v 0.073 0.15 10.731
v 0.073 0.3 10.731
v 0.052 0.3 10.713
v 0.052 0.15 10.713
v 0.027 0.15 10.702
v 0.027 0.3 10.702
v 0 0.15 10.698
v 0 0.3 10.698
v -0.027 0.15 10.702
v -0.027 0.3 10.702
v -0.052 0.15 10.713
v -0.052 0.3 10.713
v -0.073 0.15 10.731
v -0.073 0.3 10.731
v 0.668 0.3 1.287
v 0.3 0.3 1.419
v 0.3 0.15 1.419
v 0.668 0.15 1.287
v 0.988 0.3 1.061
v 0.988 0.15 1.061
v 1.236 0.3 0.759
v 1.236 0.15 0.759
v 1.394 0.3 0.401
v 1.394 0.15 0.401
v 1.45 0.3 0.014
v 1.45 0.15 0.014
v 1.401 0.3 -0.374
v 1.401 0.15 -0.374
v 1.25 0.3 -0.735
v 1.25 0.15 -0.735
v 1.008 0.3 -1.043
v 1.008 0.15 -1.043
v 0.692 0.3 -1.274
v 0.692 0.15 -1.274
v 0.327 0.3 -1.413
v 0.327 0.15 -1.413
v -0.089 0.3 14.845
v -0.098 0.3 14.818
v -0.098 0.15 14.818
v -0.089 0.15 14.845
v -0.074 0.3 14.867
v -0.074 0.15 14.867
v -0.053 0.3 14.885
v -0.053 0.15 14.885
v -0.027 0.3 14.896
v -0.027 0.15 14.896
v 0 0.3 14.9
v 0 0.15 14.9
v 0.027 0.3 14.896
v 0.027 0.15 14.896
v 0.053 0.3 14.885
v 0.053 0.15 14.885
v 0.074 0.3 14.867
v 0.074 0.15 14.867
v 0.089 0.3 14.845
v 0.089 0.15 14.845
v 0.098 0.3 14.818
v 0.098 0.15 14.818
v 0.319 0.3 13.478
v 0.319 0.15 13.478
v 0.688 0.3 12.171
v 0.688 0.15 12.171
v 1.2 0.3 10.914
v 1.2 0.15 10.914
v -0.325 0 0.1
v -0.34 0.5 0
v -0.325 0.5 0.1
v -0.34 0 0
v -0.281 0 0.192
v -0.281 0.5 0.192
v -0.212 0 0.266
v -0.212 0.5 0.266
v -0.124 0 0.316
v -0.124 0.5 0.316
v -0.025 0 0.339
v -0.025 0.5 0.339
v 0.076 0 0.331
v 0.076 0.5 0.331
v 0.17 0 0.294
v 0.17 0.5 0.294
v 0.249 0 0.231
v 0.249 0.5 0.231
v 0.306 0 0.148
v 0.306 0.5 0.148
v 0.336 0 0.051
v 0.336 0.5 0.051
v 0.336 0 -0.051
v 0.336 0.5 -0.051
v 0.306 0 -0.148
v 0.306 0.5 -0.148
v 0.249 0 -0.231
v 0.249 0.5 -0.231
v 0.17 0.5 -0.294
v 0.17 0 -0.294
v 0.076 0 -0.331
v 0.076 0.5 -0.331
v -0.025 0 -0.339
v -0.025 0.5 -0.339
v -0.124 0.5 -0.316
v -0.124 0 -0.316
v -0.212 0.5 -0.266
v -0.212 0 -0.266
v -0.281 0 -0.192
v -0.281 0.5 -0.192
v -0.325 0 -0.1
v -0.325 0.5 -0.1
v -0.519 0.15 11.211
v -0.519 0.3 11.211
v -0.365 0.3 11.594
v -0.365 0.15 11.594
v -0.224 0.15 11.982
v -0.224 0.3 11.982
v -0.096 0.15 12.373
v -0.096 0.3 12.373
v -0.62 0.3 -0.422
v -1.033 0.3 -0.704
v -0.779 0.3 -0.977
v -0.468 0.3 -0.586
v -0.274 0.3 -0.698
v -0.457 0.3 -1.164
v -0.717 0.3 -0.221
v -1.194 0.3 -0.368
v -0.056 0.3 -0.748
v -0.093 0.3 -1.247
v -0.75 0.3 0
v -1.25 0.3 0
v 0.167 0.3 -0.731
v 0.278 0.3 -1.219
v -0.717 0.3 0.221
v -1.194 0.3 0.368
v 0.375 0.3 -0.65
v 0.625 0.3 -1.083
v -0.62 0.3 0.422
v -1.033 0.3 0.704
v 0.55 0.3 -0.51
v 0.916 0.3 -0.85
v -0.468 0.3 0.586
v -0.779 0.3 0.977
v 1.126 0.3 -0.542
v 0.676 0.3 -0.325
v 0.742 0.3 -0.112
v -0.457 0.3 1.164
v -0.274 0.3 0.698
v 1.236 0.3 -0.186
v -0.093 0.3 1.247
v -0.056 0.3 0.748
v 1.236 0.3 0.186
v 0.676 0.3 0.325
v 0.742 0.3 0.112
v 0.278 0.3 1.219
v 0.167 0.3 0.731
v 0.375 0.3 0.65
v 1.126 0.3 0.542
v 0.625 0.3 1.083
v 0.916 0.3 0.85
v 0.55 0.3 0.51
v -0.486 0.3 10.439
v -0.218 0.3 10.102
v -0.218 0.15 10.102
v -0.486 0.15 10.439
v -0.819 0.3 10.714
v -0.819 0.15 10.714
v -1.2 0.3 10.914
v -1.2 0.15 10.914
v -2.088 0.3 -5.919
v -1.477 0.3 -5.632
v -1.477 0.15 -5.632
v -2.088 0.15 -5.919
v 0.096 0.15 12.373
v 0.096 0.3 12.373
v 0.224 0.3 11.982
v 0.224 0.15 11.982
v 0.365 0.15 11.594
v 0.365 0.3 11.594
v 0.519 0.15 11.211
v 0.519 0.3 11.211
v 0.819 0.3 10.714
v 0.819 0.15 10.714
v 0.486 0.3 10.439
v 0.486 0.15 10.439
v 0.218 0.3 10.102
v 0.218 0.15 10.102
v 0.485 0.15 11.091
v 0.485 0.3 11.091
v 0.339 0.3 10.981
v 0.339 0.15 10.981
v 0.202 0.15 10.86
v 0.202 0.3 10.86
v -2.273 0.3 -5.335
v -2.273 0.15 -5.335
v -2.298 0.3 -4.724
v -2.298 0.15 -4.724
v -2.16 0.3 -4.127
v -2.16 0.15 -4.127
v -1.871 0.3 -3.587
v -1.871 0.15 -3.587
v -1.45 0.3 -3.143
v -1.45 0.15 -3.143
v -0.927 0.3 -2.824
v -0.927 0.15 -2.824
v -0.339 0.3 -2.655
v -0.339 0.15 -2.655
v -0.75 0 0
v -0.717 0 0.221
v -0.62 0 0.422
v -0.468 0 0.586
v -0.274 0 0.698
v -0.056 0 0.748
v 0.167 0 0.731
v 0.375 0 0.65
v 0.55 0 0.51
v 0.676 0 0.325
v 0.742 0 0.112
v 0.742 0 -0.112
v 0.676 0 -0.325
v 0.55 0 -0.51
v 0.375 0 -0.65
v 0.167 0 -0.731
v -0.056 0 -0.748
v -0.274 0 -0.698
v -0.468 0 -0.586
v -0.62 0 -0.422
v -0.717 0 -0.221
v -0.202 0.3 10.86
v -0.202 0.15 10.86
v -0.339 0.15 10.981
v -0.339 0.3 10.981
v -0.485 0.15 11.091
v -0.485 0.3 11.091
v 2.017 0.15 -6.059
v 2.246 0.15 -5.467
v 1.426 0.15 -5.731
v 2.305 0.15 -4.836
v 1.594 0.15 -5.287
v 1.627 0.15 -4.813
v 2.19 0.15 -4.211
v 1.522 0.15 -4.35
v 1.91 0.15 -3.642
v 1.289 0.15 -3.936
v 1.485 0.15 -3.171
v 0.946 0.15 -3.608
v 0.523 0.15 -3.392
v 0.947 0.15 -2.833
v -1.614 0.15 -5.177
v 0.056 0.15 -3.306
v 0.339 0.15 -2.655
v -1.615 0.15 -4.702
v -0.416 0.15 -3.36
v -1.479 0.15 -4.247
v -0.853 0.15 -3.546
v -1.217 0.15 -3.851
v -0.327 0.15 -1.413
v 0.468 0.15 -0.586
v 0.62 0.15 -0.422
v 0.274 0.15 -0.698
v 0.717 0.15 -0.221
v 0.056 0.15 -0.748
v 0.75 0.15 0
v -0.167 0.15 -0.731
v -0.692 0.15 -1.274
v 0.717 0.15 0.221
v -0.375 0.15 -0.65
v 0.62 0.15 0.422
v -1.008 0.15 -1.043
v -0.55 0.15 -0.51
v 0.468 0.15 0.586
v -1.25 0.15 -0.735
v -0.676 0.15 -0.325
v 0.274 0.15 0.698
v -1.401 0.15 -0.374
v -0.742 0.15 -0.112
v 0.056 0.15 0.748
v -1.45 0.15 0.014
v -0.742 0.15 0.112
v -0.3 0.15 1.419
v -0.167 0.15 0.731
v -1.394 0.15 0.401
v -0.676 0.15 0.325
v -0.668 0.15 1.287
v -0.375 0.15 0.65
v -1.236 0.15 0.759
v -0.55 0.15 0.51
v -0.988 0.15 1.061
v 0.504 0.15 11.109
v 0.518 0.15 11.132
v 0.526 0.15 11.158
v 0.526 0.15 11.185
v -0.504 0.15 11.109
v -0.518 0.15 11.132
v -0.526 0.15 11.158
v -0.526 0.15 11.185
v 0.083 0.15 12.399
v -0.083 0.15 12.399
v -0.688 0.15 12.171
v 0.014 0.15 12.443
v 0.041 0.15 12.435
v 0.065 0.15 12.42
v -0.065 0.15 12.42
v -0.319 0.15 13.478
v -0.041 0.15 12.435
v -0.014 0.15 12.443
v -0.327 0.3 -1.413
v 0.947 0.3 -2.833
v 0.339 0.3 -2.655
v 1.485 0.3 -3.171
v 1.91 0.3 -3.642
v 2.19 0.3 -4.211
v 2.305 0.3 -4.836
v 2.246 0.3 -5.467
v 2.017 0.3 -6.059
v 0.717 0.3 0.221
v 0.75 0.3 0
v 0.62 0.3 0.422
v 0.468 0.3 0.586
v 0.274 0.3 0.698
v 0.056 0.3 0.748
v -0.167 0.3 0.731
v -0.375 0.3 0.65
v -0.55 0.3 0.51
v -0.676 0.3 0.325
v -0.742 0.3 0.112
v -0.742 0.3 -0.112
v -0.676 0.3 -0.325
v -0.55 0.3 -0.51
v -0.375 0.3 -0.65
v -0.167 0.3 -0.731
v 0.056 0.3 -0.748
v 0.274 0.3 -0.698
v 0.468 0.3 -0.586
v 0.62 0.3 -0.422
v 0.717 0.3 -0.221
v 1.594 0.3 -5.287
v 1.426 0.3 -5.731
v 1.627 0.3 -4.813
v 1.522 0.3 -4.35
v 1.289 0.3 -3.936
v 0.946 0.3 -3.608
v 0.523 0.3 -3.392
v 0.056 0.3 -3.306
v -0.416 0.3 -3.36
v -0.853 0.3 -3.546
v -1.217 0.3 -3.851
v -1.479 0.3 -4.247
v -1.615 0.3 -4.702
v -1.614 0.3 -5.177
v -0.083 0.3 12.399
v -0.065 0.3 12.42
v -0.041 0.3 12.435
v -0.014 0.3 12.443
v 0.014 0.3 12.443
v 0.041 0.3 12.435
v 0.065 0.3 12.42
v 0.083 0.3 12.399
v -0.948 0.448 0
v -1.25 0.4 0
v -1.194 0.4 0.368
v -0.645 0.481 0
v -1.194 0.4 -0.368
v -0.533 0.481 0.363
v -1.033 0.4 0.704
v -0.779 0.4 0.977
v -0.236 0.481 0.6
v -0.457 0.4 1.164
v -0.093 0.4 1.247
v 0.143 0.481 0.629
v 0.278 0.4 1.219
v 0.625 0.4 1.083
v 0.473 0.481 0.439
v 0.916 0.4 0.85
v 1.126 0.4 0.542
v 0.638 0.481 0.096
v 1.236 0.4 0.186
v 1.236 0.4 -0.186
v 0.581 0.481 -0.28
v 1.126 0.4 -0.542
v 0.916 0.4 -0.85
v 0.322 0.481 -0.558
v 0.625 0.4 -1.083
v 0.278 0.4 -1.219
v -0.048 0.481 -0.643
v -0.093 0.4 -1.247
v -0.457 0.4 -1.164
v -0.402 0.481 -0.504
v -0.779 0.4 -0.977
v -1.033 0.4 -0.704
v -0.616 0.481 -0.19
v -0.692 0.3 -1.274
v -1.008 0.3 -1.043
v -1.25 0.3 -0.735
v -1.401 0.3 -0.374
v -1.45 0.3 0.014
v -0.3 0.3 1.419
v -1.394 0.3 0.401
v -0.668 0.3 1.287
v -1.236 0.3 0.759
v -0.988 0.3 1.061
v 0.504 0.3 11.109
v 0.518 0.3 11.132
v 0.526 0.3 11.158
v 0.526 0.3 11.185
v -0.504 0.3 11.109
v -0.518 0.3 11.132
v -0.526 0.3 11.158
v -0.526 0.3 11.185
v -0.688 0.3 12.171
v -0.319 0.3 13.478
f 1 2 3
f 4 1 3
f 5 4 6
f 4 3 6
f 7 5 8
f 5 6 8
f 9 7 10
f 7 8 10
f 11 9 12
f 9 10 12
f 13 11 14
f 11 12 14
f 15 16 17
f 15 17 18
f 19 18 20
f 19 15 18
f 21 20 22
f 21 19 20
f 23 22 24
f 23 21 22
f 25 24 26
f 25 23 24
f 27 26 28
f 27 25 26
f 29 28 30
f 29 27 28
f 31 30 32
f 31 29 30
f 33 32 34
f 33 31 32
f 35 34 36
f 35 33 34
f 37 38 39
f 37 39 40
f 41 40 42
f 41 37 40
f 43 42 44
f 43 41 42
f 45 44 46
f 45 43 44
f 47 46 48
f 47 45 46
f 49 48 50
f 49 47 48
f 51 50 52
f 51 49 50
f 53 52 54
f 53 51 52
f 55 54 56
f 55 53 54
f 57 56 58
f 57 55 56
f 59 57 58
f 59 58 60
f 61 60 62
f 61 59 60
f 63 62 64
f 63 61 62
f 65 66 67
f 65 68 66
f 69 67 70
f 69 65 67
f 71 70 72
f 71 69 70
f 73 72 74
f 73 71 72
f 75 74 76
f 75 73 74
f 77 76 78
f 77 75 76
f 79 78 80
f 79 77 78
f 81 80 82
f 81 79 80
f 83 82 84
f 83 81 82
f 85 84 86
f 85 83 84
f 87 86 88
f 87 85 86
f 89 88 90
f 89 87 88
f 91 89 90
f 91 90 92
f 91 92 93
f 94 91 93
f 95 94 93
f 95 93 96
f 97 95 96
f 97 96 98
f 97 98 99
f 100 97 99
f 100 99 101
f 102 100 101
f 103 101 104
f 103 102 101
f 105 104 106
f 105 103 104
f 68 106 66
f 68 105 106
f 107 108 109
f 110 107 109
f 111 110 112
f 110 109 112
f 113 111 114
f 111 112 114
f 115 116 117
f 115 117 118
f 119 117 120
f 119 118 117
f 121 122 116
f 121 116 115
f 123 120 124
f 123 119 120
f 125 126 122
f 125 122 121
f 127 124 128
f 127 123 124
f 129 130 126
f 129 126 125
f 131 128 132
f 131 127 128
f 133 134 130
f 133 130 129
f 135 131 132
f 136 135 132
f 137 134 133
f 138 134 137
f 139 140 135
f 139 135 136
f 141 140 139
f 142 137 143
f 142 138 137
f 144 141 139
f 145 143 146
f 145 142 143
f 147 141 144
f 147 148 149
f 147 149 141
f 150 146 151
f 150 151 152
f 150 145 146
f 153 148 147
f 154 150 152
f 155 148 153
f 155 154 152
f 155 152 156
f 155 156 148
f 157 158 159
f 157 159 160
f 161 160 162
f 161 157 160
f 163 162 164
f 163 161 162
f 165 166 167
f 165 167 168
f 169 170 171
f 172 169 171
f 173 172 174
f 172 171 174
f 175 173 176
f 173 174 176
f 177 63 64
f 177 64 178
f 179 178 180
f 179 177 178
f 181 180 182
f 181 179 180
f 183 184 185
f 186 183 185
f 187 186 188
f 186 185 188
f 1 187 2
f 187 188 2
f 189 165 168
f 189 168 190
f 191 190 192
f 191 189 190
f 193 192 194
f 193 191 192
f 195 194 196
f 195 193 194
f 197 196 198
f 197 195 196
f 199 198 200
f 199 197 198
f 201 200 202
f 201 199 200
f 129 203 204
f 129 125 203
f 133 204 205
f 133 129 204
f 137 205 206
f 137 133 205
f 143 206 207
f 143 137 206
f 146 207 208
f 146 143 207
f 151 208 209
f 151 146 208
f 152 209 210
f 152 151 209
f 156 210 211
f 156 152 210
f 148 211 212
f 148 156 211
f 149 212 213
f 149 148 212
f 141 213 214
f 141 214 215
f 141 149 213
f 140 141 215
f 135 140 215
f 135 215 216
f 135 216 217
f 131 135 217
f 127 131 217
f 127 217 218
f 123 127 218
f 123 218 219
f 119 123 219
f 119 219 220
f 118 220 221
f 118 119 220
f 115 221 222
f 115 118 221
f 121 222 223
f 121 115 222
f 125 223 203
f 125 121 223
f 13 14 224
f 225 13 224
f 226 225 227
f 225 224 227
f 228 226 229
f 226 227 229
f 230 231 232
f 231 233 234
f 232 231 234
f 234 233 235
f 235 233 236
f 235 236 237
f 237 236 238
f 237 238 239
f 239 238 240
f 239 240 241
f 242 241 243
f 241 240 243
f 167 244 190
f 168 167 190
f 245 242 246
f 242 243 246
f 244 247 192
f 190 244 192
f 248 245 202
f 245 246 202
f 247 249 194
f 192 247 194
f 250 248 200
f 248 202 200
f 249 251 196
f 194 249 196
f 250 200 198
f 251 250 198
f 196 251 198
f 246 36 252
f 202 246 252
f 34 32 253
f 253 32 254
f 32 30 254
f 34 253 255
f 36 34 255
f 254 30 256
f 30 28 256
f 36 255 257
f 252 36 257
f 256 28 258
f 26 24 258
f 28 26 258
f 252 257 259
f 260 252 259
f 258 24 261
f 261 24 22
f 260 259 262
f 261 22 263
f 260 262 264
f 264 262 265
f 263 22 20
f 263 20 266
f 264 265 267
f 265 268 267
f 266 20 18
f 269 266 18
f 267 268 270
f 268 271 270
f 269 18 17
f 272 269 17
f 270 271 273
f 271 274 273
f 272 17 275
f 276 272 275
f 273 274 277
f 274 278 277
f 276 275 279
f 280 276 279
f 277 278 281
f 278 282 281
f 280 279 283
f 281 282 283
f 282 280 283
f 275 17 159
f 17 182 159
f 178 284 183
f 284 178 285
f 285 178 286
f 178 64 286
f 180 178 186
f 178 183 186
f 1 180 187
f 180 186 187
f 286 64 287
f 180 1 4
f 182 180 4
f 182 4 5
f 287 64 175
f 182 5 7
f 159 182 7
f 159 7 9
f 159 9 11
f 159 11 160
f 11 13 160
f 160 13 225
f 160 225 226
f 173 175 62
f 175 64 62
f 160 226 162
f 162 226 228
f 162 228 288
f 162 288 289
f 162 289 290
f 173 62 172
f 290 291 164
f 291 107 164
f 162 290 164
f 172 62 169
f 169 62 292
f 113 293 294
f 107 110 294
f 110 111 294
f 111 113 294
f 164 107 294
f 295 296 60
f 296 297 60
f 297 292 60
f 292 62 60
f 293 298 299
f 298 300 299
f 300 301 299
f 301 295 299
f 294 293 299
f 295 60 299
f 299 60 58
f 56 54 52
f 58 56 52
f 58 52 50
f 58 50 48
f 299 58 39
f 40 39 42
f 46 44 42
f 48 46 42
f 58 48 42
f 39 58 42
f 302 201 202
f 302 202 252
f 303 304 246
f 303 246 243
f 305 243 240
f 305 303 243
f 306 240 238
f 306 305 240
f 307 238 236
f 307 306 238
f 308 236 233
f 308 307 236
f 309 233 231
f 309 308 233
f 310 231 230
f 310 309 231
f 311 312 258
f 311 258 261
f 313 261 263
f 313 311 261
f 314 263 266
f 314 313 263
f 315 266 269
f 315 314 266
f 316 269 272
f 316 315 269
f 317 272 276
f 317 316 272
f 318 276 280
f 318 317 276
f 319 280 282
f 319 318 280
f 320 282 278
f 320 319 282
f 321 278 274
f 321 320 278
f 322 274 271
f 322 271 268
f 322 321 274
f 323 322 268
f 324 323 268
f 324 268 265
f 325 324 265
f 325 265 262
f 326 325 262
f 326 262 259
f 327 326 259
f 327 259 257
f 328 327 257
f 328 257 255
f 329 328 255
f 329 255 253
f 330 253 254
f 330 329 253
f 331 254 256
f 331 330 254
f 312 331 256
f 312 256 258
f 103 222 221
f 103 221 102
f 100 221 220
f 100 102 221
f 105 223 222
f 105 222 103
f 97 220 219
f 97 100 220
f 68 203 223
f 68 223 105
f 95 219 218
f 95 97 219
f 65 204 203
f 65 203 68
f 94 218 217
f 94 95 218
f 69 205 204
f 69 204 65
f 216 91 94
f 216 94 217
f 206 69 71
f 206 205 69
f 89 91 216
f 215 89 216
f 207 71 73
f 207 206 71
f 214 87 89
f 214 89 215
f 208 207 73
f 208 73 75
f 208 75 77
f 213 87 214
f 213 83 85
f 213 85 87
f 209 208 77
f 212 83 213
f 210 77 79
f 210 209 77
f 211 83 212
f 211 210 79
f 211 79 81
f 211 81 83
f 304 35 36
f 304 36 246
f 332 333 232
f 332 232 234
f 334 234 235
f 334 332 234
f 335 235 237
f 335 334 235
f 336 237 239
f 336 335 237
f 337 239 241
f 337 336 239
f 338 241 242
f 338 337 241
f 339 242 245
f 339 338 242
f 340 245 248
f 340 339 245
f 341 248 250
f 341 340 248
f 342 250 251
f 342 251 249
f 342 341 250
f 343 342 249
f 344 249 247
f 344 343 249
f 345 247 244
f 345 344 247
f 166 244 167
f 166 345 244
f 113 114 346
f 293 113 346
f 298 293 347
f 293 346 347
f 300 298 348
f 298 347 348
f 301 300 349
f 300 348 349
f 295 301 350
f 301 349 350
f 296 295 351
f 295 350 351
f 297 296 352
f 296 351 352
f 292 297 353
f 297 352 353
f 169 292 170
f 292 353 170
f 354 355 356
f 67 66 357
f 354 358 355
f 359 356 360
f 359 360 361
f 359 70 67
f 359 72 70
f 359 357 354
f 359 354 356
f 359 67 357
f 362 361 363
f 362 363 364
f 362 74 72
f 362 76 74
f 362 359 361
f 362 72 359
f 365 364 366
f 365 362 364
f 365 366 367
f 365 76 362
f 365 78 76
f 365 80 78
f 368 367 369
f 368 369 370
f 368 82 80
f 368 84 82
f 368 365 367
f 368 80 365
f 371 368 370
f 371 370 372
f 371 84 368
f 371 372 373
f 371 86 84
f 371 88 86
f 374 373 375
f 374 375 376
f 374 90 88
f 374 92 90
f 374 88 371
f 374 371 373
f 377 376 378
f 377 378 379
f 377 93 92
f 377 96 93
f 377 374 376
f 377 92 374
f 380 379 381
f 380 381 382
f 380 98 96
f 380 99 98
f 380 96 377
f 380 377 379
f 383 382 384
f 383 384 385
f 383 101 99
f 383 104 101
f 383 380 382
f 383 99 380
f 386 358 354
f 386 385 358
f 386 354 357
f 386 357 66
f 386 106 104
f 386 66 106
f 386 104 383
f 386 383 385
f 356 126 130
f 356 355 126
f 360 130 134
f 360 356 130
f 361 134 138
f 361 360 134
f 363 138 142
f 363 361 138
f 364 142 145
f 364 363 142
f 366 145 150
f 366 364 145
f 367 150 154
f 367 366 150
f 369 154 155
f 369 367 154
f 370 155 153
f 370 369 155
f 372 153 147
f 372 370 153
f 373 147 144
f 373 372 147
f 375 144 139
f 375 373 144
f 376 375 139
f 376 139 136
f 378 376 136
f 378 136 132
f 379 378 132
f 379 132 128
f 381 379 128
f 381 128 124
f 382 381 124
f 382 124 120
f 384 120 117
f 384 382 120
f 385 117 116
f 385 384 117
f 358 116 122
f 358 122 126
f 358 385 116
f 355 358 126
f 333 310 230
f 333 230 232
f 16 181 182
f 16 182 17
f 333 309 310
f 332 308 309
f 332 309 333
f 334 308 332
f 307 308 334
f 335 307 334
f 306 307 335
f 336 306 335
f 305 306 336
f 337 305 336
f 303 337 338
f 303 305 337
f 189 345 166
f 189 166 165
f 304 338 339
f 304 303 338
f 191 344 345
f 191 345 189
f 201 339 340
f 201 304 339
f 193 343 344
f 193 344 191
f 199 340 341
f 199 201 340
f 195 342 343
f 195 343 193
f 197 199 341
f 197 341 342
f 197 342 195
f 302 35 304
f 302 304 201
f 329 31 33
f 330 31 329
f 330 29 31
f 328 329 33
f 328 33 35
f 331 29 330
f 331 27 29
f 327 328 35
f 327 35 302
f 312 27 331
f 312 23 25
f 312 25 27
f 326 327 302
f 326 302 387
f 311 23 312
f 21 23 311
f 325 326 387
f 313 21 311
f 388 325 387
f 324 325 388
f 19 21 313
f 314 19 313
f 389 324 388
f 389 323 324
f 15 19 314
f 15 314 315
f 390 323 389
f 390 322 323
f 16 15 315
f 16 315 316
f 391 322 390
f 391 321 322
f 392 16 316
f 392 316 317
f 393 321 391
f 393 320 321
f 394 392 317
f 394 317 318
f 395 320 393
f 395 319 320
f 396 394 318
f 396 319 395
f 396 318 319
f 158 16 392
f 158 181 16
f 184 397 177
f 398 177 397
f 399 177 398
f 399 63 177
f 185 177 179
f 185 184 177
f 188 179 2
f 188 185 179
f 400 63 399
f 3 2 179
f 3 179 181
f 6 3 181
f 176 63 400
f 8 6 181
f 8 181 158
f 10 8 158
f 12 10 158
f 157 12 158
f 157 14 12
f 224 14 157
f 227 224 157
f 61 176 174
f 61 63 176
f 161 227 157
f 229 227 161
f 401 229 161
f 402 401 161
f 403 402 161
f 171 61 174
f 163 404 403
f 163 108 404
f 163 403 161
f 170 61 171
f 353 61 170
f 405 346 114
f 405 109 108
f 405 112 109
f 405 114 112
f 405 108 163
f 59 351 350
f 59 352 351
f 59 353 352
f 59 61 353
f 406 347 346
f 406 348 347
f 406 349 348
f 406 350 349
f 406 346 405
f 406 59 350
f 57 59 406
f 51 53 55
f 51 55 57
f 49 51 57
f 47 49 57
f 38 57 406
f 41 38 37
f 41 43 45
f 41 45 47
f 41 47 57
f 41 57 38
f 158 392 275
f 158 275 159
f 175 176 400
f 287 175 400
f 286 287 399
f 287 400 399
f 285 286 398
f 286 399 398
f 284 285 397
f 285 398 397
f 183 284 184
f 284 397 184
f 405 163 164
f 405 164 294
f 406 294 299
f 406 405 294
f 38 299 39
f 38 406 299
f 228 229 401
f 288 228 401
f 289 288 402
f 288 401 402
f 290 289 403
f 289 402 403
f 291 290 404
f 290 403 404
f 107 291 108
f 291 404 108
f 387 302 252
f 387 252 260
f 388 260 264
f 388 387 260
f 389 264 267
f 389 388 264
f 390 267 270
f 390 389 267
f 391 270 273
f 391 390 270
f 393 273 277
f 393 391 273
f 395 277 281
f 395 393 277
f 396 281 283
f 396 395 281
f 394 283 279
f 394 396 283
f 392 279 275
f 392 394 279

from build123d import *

# Parameters (mm, degrees)
ESQUISSE2_R        = 0.75
BOSS_EXTRU_1_DEPTH = 0.15


with BuildPart() as part:
    # Esquisse1 → Révolution1 (revolve)
    with BuildSketch(Plane.XY):
        with BuildLine():
            Line((-0.34, 0), (-0.75, 0))
            Line((-0.75, 0), (-0.75, 0.3))
            Line((-0.75, 0.3), (-1.25, 0.3))
            Line((-1.25, 0.3), (-1.25, 0.4))
            ThreePointArc((-1.25, 0.4), (-0.796811957, 0.466488811), (-0.34, 0.5))
            Line((-0.34, 0.5), (-0.34, 0))
        make_face()
    revolve(axis=Axis((0, 0, 0), (0, 1, 0)))


with BuildPart() as body_2:
    # Esquisse2 → Boss.-Extru.1 (new body)
    with BuildSketch(Plane.XZ.offset(-0.3)):
        with BuildLine():
            Line((0.326759739, -1.412702401), (0.338500561, -2.654946389))
            ThreePointArc((0.338500561, -2.654946389), (2.069645511, -3.917205167), (2.016508458, -6.059012001))
            Line((2.016508458, -6.059012001), (1.426021174, -5.730816496))
            ThreePointArc((1.426021174, -5.730816496), (0.055576886, -3.306493599), (-1.476723272, -5.631900076))
            Line((-1.476723272, -5.631900076), (-2.088187509, -5.91912649))
            ThreePointArc((-2.088187509, -5.91912649), (-2.033696556, -3.847305771), (-0.338500561, -2.654946389))
            Line((-0.338500561, -2.654946389), (-0.326759739, -1.412702401))
            ThreePointArc((-0.326759739, -1.412702401), (-1.449935242, 0.013703775), (-0.3, 1.418626096))
            Line((-0.3, 1.418626096), (-0.217926101, 10.102498878))
            ThreePointArc((-0.217926101, 10.102498878), (-0.645390878, 10.5850161), (-1.2, 10.913585311))
            ThreePointArc((-1.2, 10.913585311), (-0.484840229, 12.819677692), (-0.098277599, 14.818480083))
            ThreePointArc((-0.098277599, 14.818480083), (0, 14.9), (0.098277599, 14.818480083))
            ThreePointArc((0.098277599, 14.818480083), (0.484840229, 12.819677692), (1.2, 10.913585311))
            ThreePointArc((1.2, 10.913585311), (0.645390878, 10.5850161), (0.217926101, 10.102498878))
            Line((0.217926101, 10.102498878), (0.3, 1.418626096))
            ThreePointArc((0.3, 1.418626096), (1.449935242, 0.013703775), (0.326759739, -1.412702401))
        make_face()
        Circle(ESQUISSE2_R, mode=Mode.SUBTRACT)
        with BuildLine():
            ThreePointArc((0.484554357, 11.090791048), (0.269465751, 10.921587766), (0.073499847, 10.730563622))
            ThreePointArc((0.073499847, 10.730563622), (0, 10.698370499), (-0.073499847, 10.730563622))
            ThreePointArc((-0.073499847, 10.730563622), (-0.269465751, 10.921587766), (-0.484554357, 11.090791048))
            ThreePointArc((-0.484554357, 11.090791048), (-0.523101788, 11.144977331), (-0.51914325, 11.211357959))
            ThreePointArc((-0.51914325, 11.211357959), (-0.293104532, 11.787237938), (-0.095515749, 12.373488673))
            ThreePointArc((-0.095515749, 12.373488673), (0, 12.44387885), (0.095515749, 12.373488673))
            ThreePointArc((0.095515749, 12.373488673), (0.293104532, 11.787237938), (0.51914325, 11.211357959))
            ThreePointArc((0.51914325, 11.211357959), (0.523101788, 11.144977331), (0.484554357, 11.090791048))
        make_face(mode=Mode.SUBTRACT)
    extrude(amount=BOSS_EXTRU_1_DEPTH)


solid = Compound([part.part, body_2.part])
